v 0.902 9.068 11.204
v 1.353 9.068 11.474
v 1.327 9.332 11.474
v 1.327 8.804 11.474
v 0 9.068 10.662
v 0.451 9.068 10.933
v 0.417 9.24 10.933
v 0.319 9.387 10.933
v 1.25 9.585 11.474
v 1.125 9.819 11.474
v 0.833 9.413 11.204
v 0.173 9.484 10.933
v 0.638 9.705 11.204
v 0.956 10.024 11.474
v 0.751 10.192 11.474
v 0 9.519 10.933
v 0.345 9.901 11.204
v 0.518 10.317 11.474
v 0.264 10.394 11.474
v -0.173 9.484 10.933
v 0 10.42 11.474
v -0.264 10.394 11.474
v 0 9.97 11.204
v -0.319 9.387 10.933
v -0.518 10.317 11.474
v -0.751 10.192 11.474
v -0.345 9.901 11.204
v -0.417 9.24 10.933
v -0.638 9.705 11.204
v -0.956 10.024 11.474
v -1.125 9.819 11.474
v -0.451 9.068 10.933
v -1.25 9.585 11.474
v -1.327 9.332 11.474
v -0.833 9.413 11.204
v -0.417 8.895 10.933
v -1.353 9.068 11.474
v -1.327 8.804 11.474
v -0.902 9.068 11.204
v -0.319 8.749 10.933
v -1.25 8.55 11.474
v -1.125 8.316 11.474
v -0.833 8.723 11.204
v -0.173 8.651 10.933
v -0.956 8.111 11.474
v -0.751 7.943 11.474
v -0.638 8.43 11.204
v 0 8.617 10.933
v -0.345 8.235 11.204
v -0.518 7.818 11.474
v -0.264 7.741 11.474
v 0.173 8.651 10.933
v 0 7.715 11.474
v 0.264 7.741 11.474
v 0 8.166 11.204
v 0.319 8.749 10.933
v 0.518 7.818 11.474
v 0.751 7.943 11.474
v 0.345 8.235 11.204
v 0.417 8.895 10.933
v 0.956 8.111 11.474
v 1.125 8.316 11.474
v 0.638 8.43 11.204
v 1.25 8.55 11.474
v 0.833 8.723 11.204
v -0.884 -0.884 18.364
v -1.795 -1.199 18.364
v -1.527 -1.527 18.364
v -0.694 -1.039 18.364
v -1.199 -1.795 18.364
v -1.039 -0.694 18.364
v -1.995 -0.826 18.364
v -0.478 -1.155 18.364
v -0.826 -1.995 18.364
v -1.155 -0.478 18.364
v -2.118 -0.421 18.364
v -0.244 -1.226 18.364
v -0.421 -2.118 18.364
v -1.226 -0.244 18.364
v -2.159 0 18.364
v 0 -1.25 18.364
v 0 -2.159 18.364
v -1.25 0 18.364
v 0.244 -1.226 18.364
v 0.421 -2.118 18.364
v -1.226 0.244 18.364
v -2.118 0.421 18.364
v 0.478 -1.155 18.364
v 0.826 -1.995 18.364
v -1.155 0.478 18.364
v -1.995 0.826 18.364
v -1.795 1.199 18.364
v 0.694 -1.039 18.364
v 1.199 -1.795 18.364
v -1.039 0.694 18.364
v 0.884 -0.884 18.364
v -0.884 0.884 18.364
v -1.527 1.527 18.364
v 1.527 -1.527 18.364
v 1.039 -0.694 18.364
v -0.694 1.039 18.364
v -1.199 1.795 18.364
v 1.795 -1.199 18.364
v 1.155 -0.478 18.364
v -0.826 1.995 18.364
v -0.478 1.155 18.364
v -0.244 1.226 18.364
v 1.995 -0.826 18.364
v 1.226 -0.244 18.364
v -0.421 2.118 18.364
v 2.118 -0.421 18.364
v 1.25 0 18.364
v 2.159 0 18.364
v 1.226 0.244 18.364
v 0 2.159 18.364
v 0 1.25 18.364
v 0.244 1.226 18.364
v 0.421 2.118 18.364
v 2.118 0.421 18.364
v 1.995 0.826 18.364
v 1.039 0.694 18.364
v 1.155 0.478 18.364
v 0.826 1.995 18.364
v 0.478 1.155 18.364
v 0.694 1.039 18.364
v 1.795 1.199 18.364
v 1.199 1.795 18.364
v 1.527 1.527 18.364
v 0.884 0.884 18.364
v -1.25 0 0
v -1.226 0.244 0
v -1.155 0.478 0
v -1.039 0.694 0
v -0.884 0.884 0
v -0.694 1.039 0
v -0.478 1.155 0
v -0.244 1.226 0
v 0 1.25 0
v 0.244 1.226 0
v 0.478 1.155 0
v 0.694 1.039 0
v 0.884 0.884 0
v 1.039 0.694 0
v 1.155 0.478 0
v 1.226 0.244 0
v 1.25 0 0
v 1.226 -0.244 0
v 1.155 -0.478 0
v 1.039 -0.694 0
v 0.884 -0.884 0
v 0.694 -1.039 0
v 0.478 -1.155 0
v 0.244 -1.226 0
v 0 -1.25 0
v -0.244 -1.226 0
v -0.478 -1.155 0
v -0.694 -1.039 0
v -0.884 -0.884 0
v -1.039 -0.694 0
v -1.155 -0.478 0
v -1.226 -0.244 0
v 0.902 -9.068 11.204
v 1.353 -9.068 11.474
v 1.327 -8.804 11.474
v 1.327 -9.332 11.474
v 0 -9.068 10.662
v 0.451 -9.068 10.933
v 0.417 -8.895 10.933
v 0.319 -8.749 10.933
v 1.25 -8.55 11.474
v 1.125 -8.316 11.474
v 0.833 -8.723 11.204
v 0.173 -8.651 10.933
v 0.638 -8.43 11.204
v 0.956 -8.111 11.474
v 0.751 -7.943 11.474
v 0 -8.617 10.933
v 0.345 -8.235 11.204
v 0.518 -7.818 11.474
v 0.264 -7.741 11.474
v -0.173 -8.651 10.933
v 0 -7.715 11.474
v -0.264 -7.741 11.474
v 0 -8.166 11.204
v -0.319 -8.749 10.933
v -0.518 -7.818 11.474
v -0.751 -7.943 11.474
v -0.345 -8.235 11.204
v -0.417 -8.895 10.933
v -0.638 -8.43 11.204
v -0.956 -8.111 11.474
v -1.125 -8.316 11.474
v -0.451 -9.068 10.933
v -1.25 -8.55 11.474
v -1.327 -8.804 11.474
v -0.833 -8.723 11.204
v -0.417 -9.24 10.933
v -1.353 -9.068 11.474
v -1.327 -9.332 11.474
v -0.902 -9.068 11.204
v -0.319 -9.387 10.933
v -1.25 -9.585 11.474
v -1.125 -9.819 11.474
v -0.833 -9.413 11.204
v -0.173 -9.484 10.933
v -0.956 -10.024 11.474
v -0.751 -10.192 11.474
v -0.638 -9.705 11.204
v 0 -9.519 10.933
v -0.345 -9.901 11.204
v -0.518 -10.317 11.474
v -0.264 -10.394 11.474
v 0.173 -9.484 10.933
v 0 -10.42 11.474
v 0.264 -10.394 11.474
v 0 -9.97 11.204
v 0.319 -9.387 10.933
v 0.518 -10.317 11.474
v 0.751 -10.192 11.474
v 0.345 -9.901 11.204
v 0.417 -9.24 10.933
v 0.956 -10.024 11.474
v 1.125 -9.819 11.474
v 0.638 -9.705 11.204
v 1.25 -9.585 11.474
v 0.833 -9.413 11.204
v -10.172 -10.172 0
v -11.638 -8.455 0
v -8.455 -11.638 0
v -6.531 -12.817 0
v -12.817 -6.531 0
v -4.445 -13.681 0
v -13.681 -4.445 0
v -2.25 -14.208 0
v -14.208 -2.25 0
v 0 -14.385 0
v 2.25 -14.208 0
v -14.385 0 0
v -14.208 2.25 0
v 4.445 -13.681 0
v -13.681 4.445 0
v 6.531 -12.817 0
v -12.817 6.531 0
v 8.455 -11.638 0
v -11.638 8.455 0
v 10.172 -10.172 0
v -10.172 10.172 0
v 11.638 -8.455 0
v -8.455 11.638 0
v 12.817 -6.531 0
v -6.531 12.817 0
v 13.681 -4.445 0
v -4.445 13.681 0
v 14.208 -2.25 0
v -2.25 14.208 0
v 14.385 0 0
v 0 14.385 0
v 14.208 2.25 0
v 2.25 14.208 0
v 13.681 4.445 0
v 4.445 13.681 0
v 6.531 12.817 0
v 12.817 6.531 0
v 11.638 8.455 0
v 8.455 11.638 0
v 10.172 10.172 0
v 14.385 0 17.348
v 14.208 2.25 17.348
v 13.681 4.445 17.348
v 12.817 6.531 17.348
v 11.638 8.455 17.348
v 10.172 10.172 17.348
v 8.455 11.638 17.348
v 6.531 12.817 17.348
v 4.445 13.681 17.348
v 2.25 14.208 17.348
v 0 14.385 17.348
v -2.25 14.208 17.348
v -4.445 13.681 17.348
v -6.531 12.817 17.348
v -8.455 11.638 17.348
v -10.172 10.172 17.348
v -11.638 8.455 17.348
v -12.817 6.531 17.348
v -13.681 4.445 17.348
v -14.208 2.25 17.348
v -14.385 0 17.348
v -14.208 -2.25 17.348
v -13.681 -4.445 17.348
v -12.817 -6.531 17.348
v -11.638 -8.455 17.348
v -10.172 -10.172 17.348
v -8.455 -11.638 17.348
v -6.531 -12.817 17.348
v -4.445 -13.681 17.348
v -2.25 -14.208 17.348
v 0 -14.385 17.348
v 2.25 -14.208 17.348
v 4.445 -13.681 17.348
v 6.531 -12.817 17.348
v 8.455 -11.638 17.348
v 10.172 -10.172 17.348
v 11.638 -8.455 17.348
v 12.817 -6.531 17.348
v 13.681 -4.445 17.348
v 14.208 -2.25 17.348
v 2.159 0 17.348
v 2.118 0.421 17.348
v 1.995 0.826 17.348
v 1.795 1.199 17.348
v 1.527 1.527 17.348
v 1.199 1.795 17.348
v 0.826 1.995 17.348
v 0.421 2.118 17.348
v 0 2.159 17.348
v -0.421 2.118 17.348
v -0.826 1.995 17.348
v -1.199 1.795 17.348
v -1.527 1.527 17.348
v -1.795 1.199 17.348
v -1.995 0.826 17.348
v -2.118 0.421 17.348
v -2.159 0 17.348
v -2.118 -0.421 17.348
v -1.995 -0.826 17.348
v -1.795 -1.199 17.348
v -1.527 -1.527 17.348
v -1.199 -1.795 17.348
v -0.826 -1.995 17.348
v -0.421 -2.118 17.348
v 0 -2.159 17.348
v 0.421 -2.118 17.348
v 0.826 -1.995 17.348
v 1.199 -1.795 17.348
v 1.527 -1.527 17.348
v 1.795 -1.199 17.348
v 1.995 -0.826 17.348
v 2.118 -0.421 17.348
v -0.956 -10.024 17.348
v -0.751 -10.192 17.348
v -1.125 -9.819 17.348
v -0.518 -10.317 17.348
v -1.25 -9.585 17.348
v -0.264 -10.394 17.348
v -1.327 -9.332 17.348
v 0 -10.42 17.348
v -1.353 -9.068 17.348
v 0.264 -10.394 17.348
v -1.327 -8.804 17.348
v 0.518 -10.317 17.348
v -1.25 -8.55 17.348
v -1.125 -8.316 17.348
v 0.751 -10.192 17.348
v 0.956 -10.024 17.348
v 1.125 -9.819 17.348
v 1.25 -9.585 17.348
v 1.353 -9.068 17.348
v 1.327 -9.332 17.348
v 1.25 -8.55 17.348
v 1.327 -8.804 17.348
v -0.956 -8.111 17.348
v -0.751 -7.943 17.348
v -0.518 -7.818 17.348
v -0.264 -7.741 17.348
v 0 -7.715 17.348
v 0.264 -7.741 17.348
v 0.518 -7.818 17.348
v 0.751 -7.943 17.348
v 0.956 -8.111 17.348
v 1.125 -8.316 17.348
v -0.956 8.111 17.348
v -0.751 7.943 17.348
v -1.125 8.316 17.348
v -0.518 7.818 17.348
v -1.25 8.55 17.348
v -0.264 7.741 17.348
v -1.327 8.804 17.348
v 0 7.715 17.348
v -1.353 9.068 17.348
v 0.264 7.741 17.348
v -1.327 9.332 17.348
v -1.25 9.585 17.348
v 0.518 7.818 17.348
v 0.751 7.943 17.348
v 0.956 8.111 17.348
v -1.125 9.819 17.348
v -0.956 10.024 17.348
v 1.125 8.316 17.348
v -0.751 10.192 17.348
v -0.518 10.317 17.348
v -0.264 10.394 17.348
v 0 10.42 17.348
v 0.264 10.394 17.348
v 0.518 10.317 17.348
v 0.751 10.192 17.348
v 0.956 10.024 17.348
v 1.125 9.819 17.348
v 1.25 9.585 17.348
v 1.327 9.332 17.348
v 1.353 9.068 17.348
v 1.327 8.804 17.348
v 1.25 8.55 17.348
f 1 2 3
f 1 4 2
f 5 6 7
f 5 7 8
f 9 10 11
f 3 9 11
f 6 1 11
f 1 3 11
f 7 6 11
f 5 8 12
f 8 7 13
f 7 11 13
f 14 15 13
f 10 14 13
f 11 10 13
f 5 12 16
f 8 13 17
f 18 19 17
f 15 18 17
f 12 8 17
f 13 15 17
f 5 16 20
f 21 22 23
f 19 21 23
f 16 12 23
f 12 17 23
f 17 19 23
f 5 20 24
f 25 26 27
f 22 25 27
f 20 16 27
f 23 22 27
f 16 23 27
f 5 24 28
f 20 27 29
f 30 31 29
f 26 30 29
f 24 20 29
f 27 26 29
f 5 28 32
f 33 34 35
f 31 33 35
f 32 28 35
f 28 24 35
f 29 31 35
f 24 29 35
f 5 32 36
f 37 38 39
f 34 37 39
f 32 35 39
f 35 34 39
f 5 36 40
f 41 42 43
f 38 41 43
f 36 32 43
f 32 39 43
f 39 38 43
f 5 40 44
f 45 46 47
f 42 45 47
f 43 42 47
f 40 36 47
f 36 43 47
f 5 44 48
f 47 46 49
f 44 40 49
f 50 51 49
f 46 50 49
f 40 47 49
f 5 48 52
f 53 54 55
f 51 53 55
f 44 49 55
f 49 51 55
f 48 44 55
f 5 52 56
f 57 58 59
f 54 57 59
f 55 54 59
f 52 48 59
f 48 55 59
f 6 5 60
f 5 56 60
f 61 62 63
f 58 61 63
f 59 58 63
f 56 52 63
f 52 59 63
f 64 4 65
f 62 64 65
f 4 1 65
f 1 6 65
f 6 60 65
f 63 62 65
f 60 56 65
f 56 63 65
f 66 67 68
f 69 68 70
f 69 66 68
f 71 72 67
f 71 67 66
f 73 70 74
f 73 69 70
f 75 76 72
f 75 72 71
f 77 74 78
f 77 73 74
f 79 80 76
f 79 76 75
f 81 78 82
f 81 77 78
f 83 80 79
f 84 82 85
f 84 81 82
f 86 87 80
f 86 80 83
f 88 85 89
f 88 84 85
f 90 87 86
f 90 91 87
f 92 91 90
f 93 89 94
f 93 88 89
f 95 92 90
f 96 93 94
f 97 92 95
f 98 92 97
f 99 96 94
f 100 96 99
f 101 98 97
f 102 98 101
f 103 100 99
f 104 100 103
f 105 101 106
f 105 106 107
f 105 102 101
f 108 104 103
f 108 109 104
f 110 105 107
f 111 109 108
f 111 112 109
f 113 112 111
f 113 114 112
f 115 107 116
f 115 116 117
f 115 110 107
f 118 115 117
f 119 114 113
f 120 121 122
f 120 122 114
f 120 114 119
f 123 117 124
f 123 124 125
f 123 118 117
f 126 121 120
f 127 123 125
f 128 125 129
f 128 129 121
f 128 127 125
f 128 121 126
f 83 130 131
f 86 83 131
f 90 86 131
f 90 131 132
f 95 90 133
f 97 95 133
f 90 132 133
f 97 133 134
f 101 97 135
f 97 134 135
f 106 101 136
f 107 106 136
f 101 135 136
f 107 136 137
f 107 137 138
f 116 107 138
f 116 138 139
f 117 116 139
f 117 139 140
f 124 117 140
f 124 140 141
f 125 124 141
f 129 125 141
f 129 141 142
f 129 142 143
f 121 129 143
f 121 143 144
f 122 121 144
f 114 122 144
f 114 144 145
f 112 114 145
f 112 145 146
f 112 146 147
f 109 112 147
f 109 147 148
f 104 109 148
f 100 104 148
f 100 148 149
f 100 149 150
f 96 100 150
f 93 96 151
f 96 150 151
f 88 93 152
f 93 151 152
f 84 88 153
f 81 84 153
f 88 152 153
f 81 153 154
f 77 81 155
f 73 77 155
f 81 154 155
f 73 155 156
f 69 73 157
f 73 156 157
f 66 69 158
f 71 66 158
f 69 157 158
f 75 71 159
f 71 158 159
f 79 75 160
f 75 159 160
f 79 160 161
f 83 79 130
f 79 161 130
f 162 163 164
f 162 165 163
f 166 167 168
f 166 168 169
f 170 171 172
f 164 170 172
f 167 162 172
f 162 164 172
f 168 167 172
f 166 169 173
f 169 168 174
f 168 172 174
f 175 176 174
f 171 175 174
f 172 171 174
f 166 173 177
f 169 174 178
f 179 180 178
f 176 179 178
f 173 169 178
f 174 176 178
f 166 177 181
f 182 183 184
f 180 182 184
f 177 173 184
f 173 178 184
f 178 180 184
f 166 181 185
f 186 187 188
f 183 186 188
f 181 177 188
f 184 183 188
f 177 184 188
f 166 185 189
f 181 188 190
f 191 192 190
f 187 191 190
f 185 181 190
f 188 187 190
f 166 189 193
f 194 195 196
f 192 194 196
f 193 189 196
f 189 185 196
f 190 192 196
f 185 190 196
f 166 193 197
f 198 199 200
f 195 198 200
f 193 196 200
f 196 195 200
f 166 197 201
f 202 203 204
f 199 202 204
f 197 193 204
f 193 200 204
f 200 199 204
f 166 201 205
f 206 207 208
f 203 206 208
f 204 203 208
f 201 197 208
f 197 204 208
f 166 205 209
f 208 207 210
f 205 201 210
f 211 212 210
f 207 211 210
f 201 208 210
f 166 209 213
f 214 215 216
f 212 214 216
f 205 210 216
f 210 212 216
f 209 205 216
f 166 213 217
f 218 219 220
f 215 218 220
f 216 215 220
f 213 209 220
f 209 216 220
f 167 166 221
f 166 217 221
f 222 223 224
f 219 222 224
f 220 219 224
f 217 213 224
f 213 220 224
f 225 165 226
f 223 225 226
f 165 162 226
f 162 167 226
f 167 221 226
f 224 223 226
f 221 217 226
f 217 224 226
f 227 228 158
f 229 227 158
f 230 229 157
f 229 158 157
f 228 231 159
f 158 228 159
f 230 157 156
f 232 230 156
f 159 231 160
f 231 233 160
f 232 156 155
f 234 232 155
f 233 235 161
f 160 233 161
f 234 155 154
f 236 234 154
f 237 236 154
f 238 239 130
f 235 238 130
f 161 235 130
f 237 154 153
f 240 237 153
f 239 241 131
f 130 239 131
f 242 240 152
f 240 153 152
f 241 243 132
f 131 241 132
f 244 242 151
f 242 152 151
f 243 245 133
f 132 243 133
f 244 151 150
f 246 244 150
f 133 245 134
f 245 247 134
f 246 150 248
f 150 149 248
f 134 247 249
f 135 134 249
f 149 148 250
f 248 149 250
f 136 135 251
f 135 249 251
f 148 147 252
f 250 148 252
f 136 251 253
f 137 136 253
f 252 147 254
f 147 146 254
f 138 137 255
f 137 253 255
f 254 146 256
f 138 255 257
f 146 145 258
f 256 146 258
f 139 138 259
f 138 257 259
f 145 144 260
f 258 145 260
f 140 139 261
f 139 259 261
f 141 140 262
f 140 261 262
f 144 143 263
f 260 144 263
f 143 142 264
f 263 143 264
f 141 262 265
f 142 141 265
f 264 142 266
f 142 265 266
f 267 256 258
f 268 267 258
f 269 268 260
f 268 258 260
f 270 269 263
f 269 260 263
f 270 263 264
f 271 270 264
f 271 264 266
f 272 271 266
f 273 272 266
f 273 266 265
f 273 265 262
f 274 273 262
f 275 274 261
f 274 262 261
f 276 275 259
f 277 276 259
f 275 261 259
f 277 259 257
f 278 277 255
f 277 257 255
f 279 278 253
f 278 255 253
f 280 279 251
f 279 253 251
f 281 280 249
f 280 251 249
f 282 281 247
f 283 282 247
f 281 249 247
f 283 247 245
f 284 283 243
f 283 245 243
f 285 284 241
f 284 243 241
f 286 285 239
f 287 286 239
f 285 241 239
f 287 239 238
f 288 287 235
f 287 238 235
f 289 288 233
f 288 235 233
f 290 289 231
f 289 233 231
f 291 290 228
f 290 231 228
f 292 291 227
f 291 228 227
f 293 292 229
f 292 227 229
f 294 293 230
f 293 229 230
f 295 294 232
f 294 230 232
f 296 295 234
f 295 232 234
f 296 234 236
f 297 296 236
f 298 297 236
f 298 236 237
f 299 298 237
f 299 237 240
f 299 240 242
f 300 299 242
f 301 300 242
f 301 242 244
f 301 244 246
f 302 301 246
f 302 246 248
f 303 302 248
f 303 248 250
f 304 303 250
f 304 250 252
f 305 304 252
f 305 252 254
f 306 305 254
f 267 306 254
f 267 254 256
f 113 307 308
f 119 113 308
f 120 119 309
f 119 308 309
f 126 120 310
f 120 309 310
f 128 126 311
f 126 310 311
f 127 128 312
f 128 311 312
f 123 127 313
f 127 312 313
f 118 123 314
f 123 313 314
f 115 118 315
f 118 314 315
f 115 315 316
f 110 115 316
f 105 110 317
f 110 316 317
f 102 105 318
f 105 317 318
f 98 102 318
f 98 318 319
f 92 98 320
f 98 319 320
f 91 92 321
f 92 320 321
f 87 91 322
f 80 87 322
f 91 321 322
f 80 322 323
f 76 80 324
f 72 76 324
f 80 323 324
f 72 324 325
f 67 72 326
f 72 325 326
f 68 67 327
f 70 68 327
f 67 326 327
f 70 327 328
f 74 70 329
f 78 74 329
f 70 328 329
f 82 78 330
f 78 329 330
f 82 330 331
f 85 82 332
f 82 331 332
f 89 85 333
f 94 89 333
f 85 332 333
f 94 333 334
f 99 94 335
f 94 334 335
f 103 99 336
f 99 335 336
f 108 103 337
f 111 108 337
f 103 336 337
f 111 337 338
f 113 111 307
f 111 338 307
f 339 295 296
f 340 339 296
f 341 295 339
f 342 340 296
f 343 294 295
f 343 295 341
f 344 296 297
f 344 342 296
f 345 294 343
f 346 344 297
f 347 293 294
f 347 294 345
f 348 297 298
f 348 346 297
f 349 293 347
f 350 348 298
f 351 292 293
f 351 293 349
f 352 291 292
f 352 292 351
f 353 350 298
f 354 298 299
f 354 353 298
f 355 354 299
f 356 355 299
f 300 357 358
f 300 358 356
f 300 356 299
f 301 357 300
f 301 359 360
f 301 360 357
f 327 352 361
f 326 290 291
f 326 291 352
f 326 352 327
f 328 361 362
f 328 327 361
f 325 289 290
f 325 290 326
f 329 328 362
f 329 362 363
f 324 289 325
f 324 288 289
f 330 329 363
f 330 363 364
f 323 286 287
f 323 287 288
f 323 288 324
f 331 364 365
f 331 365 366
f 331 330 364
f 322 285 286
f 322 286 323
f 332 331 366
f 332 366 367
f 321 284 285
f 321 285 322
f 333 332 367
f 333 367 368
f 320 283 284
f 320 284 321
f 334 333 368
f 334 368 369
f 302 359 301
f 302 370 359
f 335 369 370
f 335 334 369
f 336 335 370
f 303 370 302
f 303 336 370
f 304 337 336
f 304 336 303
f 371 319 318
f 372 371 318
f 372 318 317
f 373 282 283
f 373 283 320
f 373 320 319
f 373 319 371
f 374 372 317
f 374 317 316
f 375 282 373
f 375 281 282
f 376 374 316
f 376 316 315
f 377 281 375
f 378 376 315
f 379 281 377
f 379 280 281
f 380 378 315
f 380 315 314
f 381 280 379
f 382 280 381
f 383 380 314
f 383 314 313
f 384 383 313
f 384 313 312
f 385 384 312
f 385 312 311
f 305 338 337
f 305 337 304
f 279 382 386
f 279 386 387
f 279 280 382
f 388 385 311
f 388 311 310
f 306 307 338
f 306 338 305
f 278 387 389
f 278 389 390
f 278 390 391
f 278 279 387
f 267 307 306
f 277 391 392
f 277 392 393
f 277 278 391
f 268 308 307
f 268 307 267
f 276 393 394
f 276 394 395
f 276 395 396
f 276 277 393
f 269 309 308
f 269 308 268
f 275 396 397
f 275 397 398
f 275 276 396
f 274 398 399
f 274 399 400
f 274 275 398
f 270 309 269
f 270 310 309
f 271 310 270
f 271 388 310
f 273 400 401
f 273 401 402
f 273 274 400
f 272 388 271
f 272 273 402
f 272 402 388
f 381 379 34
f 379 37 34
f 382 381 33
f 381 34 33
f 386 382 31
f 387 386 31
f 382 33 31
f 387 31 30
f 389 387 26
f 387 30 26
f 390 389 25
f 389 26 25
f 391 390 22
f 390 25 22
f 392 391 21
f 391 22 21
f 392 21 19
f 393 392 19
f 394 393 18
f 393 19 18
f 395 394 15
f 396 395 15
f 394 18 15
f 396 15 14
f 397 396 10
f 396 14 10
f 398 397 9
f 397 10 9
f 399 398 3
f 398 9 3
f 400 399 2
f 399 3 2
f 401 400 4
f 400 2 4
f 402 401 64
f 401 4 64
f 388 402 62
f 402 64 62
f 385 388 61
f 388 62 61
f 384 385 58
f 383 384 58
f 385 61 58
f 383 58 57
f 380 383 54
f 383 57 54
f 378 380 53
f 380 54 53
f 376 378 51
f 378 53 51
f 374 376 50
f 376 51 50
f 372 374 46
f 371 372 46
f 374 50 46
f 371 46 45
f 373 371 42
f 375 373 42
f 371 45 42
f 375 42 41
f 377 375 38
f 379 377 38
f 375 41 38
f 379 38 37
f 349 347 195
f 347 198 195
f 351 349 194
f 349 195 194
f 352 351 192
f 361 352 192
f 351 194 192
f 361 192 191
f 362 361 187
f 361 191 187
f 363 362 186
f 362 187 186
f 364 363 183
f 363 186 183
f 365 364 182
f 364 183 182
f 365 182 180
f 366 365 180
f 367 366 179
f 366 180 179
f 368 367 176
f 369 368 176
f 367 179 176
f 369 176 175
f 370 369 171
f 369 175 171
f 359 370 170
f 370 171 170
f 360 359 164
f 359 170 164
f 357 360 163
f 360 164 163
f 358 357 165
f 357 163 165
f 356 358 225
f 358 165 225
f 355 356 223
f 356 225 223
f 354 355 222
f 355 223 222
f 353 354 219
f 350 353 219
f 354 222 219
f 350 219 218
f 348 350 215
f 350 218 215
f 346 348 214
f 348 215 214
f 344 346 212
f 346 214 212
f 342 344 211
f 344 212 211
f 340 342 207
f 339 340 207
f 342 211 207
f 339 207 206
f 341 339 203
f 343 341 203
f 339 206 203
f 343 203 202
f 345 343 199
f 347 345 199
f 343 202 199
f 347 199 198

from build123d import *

# Parameters (mm, degrees)
F0_R     = 14.3848333842
F1_DEPTH = 17.3482
F4_R     = 2.159
F5_DEPTH = 1.016
F6_D     = 2.7051
F6_DEPTH = 5.87375
F6_TIP   = 0.8126940303
F8_D     = 2.5


# Not quite as in the source:
# - a feature names something its author has since deleted; it is built from what else it names


with BuildPart() as f1:
    # F0 (on Top) → F1 (new body)
    with BuildSketch(Plane.XY):
        Circle(F0_R)
    extrude(amount=F1_DEPTH)

    # F4 (on face) → F5 (join)
    with BuildSketch(Plane.XY.offset(17.3482)):
        Circle(F4_R)
    extrude(amount=F5_DEPTH)

    # F6
    with Locations(Plane.XY.offset(17.3482)):
        with Locations((0, 9.0678), (0, -9.0678)):
            Hole(F6_D / 2, depth=F6_DEPTH)
            with Locations((0, 0, -(F6_DEPTH + F6_TIP / 2))):  # 118° drill point
                Cone(0, F6_D / 2, F6_TIP, mode=Mode.SUBTRACT)

    # F8 (through all)
    with Locations(Plane.XY.offset(18.3642)):
        with Locations((0, 0)):
            Hole(F8_D / 2)


solid = f1.part
